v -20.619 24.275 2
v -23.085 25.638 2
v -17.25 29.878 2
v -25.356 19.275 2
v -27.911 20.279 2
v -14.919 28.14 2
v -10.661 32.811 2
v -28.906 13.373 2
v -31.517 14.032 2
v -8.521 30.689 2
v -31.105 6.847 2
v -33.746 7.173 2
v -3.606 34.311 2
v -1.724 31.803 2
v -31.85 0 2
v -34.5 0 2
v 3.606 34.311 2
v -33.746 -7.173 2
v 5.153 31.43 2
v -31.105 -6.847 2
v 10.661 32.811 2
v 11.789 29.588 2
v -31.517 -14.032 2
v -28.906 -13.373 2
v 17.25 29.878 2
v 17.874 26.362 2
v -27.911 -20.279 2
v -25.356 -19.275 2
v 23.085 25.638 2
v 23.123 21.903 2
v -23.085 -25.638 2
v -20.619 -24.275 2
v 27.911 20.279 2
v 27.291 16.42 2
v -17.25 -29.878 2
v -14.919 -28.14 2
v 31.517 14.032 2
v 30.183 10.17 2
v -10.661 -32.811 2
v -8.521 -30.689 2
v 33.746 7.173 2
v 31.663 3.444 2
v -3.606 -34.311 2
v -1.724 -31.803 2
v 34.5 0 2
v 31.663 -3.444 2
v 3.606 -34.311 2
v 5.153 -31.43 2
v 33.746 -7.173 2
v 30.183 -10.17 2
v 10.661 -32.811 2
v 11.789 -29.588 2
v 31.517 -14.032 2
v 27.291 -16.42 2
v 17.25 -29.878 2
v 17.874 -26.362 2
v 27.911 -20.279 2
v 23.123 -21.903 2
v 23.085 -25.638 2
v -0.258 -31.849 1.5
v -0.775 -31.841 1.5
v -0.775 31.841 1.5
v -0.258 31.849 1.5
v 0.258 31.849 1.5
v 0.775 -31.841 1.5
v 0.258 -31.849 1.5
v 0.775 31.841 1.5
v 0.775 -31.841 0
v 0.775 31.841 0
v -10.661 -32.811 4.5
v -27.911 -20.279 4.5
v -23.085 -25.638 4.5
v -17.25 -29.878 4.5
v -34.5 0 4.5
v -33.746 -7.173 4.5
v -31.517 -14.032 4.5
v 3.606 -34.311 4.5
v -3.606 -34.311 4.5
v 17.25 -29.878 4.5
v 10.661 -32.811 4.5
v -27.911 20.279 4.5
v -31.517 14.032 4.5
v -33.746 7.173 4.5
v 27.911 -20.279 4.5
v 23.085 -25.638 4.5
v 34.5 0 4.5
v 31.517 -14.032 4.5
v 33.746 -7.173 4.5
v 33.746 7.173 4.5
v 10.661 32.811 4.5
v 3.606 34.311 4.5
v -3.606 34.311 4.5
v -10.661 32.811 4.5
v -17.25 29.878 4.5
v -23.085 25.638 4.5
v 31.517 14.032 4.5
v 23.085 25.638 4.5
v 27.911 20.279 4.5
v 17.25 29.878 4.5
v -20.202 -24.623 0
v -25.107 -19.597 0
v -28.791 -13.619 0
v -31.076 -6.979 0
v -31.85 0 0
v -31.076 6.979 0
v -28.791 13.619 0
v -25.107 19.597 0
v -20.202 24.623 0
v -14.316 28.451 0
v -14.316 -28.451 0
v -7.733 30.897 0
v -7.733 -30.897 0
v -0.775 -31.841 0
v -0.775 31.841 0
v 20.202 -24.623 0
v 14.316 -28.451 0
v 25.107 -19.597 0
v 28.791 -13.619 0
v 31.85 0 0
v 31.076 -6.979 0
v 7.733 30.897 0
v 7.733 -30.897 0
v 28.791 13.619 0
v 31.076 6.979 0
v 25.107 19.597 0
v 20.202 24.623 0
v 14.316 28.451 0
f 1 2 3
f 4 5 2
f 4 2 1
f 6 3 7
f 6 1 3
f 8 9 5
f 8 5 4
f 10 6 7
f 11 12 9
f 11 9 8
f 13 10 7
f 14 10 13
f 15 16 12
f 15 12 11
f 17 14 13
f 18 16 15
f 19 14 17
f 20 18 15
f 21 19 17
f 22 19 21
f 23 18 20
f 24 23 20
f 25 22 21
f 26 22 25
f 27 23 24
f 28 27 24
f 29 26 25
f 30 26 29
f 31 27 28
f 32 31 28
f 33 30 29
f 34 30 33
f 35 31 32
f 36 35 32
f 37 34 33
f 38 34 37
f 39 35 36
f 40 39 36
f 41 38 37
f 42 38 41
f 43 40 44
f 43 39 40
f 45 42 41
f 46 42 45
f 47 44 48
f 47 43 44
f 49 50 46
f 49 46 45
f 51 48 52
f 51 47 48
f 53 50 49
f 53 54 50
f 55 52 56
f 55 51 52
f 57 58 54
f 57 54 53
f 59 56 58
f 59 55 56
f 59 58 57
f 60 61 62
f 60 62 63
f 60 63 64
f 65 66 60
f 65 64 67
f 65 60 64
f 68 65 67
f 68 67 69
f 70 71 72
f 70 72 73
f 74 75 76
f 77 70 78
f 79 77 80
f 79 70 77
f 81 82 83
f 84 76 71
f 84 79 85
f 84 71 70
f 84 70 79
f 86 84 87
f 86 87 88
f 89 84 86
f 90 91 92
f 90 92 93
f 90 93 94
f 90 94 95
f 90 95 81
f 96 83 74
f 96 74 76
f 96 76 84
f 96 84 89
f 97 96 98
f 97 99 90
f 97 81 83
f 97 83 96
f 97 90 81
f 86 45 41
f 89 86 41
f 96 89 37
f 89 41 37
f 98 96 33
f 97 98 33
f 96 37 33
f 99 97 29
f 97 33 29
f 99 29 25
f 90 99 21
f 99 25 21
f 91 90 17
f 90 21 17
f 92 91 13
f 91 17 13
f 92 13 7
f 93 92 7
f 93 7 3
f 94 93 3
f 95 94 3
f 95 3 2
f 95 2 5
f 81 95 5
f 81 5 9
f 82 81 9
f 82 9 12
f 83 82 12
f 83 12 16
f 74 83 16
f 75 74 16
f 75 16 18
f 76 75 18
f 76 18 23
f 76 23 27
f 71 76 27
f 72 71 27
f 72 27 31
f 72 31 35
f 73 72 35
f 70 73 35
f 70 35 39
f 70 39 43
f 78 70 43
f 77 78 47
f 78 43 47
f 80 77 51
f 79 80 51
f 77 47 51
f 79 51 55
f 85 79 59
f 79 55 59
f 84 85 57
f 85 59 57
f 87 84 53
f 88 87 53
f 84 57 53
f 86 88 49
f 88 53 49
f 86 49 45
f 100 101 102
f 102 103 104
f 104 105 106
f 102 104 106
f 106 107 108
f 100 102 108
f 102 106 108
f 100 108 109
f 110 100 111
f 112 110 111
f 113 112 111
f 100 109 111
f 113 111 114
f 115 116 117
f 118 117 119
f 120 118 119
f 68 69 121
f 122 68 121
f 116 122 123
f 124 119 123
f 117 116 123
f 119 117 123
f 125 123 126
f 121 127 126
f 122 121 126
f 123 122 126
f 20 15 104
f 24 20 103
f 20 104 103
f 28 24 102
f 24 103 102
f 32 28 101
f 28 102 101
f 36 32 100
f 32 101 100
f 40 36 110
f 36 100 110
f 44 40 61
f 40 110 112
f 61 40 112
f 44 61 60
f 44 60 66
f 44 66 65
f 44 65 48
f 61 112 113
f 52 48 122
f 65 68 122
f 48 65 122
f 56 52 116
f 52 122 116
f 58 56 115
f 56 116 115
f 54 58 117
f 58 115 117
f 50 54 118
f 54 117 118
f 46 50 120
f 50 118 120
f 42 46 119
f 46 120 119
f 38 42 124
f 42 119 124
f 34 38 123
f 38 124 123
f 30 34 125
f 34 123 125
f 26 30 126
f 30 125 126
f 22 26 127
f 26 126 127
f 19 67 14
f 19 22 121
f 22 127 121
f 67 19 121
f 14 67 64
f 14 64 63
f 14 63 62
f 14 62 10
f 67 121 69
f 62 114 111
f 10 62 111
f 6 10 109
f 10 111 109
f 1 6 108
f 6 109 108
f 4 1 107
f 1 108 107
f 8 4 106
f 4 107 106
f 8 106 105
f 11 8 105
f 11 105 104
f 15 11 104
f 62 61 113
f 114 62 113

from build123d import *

# Parameters (mm, degrees)
SKETCH1_R               = 34.5
BOSS_EXTRUDE1_DEPTH     = 4.5
SKETCH2_W               = 2.65
SKETCH2_H               = 2
CUT_EXTRUDE1_DEPTH      = 49.997448913
CUT_EXTRUDE1_DEPTH_BACK = 49.997448913
SKETCH4_W               = 1.55
SKETCH4_H               = 1.5


with BuildPart() as part:
    # Sketch1 → Boss-Extrude1 (new body)
    with BuildSketch(Plane.XY):
        Circle(SKETCH1_R)
    extrude(amount=BOSS_EXTRUDE1_DEPTH)

    # Sketch2 → Cut-Revolve1 (revolve, cut)
    with BuildSketch(Plane(origin=(0, 0, 0), x_dir=(1, 0, 0), z_dir=(0, 1, 0)), mode=Mode.PRIVATE) as cut_revolve1_sk:
        with Locations((33.175, -1)):
            Rectangle(SKETCH2_W, SKETCH2_H)
    revolve(cut_revolve1_sk.sketch.rotate(Axis((0, 0, 0), (0, 0, 1)), 180), axis=Axis((0, 0, 0), (0, 0, 1)), mode=Mode.SUBTRACT)

    # Sketch4 → Cut-Extrude1 (cut, two sides: drawn at the far end of the back side and taken through both)
    with BuildSketch(Plane(origin=(0, 0, 0), x_dir=(1, 0, 0), z_dir=(0, 1, 0)).offset(-CUT_EXTRUDE1_DEPTH_BACK)):
        with Locations((0, -0.75)):
            Rectangle(SKETCH4_W, SKETCH4_H)
    extrude(amount=CUT_EXTRUDE1_DEPTH + CUT_EXTRUDE1_DEPTH_BACK, mode=Mode.SUBTRACT)


solid = part.part
